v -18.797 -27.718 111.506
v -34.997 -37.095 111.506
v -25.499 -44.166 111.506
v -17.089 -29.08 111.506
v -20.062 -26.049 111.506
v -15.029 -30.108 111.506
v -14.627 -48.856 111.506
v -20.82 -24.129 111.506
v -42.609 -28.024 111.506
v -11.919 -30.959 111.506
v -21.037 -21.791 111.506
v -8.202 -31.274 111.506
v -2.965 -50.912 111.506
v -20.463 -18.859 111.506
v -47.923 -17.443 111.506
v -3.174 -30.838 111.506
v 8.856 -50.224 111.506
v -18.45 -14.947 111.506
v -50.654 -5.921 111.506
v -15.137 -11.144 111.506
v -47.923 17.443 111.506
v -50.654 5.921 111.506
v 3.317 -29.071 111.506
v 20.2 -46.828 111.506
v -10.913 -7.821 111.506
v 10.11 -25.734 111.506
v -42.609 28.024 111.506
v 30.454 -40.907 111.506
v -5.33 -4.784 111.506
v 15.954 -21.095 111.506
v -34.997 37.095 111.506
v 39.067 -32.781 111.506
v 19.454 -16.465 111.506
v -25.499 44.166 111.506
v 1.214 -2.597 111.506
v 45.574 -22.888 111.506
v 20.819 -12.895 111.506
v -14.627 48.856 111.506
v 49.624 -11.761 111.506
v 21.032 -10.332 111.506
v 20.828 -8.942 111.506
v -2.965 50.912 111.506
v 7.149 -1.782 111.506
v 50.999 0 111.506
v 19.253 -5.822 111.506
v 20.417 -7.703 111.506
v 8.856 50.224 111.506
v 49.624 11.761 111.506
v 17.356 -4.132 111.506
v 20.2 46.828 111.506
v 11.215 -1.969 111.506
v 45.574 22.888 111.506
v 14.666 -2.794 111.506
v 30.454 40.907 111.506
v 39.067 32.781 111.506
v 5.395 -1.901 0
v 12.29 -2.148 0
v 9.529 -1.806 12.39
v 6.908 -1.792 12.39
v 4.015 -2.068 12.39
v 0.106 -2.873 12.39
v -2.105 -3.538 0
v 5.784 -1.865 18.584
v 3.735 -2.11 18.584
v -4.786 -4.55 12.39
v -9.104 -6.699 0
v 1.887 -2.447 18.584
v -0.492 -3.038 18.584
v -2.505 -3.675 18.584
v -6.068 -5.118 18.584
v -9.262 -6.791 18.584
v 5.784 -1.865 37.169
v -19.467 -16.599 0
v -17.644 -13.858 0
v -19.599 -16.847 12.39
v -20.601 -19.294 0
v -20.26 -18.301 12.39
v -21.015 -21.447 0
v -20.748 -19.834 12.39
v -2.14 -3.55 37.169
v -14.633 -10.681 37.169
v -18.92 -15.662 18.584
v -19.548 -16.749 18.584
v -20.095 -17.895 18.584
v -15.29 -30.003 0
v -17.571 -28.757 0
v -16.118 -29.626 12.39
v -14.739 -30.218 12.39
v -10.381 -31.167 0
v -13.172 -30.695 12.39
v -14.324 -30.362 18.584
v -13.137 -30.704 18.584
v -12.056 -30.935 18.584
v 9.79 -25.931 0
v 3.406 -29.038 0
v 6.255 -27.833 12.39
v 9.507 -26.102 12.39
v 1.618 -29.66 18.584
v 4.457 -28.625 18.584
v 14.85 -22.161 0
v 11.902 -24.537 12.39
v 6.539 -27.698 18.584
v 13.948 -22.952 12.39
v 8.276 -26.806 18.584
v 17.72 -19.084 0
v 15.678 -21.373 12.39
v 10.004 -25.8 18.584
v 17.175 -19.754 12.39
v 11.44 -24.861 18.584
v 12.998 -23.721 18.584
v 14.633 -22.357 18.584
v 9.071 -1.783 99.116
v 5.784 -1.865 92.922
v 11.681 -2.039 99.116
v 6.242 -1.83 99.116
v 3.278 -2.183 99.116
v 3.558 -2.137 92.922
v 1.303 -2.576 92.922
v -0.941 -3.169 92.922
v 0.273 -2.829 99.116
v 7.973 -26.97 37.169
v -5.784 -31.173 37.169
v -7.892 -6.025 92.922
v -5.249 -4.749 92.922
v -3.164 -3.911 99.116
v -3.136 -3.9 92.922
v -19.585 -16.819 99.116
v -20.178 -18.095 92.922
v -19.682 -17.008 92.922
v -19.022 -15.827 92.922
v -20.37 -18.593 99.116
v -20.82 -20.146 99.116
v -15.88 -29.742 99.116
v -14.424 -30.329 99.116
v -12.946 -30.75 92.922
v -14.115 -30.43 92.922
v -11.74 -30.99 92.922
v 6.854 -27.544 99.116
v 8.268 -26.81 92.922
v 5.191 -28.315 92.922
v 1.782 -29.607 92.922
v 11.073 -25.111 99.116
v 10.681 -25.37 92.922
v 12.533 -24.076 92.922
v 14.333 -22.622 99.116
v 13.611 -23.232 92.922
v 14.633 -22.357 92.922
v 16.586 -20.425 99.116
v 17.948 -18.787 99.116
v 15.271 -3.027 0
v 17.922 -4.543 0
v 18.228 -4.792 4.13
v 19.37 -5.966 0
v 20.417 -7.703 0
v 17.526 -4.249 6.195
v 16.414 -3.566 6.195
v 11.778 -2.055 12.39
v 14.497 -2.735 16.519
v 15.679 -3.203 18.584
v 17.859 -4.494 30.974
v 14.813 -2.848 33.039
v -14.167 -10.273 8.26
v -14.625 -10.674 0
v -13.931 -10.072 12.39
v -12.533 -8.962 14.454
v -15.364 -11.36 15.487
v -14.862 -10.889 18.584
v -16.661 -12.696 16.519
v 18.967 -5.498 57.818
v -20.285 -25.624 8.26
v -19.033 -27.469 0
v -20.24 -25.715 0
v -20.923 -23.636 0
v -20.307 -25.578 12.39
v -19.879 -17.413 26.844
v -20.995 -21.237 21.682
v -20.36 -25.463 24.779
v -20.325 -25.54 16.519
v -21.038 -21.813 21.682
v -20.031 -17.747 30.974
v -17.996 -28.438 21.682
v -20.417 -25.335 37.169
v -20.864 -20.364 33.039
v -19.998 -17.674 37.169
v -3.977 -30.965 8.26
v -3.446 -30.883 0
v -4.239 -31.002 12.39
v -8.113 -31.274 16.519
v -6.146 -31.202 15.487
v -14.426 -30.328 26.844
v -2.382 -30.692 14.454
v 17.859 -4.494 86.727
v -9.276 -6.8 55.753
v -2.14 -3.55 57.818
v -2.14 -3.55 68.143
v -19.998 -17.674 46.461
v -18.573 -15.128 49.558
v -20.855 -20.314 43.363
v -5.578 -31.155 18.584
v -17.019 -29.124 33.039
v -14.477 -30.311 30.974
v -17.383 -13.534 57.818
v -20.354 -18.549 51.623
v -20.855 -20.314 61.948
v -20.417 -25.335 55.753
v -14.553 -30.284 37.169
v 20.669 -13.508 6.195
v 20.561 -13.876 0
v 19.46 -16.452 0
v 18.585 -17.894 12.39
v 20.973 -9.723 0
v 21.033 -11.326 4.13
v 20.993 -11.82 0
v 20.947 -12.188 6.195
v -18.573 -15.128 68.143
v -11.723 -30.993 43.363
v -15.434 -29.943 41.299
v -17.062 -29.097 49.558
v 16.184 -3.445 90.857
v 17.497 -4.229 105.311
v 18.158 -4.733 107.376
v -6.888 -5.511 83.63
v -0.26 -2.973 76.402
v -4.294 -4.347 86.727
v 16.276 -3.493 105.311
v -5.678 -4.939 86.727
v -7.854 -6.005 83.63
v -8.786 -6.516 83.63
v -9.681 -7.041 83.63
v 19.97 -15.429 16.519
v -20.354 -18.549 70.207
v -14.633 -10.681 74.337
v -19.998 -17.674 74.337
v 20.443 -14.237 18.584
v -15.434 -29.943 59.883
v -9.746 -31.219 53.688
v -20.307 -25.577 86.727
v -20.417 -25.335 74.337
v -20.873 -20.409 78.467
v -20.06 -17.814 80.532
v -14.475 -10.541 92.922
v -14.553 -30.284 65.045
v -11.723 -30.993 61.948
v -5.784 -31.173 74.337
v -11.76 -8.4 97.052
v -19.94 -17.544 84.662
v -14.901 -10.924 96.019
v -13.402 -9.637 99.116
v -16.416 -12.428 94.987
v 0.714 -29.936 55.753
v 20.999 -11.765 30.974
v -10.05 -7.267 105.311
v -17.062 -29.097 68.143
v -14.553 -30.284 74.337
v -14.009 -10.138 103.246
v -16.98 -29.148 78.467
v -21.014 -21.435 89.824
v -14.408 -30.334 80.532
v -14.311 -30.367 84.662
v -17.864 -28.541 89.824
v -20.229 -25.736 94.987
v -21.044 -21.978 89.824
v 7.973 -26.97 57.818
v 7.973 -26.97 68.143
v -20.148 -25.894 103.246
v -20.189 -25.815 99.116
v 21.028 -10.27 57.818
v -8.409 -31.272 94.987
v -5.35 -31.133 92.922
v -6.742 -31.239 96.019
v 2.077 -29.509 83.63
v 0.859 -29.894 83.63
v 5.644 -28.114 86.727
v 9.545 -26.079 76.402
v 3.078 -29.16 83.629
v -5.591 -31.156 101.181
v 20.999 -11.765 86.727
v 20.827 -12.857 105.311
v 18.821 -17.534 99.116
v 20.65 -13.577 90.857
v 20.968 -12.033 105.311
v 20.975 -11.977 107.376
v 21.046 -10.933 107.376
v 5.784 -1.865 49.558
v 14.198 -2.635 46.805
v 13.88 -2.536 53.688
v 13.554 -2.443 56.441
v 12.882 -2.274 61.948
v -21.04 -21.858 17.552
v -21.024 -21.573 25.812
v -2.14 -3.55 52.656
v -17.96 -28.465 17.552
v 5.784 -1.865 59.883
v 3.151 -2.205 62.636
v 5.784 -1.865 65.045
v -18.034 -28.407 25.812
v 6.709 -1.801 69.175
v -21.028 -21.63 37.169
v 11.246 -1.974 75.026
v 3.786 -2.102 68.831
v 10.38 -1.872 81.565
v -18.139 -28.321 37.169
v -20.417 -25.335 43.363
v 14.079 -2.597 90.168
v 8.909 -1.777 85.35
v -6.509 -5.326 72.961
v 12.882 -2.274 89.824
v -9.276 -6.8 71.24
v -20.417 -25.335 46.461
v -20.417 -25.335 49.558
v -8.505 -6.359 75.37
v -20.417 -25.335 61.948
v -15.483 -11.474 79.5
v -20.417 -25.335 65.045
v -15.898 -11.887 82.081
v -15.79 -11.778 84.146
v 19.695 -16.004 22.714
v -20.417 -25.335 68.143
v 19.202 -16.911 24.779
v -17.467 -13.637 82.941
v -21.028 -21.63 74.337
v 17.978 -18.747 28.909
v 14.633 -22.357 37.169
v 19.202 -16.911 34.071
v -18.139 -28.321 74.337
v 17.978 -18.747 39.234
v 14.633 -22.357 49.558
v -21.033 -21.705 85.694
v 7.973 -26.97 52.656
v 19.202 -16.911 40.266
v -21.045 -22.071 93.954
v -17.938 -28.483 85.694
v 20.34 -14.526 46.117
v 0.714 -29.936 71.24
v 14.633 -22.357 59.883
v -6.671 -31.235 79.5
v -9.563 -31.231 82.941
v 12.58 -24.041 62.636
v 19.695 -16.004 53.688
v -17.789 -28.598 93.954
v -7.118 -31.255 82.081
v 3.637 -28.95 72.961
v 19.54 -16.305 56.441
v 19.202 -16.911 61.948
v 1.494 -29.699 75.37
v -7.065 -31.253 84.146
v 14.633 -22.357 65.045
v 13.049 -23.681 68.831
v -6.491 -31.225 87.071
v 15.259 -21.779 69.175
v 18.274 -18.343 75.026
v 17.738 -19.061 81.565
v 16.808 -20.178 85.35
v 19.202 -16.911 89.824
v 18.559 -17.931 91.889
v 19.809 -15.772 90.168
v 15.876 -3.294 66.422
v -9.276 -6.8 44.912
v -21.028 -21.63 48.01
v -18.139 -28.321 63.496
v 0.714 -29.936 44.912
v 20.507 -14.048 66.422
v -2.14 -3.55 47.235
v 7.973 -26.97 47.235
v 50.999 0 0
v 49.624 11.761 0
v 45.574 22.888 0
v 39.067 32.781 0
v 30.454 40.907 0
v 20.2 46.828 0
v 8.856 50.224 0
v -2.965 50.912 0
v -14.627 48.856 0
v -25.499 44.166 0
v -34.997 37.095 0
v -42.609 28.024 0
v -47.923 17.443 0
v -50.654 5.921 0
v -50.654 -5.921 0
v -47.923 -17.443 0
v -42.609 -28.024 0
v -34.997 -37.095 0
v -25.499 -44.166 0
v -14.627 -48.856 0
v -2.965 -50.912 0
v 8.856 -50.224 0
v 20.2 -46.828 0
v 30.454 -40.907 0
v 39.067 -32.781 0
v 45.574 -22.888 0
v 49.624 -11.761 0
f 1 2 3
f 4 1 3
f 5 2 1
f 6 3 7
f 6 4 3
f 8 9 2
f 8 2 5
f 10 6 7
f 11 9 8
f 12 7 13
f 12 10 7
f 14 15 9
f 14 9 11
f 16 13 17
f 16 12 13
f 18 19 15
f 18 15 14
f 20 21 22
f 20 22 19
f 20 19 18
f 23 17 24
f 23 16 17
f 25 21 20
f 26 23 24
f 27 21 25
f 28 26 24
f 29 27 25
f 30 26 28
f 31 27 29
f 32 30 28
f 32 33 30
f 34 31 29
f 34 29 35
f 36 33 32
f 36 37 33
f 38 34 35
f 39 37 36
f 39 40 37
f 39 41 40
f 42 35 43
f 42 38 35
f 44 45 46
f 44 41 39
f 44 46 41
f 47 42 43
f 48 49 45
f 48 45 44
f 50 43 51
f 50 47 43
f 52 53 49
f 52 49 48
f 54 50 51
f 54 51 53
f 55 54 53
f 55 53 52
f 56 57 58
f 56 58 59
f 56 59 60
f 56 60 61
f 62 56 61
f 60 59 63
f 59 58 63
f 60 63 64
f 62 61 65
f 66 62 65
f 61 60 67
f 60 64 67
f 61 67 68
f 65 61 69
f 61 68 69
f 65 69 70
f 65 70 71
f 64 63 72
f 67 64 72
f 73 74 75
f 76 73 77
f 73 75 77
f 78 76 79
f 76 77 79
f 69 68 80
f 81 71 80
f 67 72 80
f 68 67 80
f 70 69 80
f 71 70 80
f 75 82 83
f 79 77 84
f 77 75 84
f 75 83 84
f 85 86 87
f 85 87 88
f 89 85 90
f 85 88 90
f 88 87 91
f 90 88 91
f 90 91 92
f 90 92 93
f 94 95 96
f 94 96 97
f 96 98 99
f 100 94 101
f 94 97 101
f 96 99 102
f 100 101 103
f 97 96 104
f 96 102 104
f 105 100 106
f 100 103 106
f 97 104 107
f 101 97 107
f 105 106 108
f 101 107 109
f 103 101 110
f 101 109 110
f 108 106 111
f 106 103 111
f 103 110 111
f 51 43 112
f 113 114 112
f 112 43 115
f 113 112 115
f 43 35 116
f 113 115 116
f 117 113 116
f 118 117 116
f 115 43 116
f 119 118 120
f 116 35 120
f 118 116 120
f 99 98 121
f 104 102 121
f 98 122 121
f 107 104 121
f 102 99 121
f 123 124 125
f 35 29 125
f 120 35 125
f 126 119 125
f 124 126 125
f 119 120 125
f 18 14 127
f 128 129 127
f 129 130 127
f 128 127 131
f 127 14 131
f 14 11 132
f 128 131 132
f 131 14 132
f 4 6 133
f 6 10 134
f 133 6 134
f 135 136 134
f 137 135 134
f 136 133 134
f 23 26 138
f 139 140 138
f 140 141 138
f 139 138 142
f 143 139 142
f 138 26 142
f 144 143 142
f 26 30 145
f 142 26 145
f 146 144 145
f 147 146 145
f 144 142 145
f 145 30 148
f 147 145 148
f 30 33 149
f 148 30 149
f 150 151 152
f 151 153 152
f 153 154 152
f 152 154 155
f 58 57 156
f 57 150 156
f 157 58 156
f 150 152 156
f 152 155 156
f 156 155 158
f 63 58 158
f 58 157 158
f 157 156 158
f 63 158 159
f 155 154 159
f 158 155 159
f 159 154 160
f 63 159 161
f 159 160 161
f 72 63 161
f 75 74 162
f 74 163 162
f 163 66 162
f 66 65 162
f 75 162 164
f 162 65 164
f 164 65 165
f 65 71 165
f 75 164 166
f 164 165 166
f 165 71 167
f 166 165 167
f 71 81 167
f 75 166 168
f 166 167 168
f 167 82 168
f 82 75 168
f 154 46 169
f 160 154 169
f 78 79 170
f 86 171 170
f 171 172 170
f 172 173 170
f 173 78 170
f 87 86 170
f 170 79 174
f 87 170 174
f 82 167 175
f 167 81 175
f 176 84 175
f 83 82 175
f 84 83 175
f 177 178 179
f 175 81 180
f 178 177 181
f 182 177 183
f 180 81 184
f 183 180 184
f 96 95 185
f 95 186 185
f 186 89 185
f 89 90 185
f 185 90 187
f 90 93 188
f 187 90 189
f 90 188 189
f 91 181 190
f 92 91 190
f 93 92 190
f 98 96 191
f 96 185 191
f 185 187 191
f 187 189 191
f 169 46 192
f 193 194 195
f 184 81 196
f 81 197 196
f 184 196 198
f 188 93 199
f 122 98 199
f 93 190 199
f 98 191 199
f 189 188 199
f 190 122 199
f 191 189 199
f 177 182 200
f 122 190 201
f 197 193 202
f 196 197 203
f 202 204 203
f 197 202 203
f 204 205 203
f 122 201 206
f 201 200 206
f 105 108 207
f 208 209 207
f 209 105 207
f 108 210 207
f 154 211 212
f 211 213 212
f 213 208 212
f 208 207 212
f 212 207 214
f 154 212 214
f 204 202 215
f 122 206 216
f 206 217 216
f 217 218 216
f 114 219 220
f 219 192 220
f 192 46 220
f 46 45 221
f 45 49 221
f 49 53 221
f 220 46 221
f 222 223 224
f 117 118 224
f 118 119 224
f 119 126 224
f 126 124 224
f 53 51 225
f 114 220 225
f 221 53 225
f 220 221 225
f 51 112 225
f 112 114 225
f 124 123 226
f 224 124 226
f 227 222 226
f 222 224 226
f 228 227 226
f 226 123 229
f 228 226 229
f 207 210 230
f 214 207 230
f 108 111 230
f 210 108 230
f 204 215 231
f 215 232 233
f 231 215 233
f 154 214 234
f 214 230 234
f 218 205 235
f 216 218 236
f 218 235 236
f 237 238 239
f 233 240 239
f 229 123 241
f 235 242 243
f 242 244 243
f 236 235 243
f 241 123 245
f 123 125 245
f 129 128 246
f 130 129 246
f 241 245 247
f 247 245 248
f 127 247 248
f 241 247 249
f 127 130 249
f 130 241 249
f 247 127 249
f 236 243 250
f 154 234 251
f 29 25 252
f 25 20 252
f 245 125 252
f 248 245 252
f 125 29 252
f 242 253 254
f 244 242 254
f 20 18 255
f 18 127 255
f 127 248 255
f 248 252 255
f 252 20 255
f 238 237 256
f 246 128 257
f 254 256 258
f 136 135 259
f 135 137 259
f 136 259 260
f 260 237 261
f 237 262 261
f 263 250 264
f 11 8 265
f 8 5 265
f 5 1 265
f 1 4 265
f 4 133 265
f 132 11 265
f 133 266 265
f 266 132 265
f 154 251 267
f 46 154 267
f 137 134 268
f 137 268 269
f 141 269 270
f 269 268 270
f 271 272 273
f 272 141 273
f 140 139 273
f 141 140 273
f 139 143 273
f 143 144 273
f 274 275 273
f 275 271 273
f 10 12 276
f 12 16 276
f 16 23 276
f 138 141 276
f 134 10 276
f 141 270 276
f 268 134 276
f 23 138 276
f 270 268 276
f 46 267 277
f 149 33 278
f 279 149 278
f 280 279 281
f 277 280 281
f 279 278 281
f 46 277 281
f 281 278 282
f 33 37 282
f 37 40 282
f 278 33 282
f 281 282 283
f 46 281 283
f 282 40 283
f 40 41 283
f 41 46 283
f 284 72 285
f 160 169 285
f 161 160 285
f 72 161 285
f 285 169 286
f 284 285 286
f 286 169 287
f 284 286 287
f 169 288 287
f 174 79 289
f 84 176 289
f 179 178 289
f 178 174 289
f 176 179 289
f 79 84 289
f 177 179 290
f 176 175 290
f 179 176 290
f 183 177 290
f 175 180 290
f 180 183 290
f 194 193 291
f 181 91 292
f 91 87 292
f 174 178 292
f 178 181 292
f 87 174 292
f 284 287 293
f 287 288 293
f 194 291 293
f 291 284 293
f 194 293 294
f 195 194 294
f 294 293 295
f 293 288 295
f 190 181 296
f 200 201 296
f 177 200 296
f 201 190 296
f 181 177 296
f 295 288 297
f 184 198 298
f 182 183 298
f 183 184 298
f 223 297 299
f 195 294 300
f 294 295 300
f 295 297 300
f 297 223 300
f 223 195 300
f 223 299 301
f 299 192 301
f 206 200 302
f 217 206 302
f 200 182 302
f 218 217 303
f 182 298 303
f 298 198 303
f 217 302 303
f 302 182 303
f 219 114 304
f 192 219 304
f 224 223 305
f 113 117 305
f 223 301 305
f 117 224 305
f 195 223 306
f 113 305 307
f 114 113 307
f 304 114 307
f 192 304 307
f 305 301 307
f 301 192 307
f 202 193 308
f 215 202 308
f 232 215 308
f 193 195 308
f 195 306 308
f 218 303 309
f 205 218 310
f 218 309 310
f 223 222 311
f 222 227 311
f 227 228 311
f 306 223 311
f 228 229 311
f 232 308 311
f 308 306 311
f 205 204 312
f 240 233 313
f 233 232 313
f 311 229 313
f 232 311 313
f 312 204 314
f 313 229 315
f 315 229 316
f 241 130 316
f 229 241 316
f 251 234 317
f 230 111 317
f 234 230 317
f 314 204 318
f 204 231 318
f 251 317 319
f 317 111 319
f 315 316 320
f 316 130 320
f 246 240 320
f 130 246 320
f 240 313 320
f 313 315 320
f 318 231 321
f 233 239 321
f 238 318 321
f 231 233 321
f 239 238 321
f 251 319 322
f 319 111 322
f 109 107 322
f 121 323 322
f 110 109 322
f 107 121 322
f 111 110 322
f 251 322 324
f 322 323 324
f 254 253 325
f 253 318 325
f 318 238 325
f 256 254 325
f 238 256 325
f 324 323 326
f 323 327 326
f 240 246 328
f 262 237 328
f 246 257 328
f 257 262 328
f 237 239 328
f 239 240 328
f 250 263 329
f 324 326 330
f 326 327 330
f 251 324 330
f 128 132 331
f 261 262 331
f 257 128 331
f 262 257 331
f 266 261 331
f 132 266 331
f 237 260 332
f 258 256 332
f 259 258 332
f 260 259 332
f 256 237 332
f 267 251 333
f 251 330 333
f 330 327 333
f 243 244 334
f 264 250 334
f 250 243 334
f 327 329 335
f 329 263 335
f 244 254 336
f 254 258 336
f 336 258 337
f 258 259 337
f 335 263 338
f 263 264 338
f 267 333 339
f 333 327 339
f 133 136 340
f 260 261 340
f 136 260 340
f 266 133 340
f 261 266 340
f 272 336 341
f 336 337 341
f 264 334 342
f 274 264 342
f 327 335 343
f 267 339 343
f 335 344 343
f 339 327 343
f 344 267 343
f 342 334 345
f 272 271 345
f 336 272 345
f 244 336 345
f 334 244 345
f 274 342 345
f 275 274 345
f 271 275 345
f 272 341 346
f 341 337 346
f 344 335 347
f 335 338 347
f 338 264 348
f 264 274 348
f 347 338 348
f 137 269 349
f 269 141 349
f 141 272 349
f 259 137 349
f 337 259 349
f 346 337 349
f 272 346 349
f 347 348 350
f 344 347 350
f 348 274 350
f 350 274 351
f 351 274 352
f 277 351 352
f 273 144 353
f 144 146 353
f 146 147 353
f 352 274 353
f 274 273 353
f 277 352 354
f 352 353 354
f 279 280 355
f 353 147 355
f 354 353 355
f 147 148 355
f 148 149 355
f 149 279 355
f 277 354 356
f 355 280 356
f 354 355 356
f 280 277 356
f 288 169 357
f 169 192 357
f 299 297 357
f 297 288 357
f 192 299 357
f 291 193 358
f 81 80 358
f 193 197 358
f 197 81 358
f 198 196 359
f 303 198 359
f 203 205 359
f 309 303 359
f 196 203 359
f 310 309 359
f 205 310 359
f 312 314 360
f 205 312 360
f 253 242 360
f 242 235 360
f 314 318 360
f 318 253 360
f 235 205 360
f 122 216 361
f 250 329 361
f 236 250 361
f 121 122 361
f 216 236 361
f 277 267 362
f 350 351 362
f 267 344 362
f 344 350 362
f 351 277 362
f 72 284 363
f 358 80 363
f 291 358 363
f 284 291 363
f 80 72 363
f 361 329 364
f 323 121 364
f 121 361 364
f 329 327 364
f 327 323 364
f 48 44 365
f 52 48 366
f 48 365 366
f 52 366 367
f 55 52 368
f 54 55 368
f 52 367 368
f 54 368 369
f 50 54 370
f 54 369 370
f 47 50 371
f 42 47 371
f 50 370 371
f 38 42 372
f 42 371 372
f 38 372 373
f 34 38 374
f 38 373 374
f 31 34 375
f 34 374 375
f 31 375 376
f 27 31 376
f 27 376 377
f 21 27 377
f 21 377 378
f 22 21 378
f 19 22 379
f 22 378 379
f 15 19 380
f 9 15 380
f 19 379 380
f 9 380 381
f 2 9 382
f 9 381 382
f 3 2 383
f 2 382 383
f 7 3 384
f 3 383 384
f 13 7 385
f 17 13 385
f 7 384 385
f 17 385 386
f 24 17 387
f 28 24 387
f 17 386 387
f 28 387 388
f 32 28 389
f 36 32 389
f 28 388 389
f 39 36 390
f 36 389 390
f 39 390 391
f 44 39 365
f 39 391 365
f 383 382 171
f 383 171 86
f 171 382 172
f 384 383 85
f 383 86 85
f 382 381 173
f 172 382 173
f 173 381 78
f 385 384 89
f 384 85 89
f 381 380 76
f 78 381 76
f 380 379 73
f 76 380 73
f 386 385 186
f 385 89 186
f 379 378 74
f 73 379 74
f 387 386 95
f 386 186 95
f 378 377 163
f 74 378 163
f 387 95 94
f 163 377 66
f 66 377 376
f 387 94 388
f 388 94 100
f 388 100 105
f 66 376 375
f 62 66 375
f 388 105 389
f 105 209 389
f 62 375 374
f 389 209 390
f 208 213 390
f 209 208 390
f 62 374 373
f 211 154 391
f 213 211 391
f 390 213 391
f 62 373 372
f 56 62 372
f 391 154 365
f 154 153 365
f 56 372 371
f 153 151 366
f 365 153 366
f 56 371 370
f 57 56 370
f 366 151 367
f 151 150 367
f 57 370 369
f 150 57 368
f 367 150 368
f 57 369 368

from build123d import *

# Parameters (mm, degrees)
F0_R     = 50.998703
F1_DEPTH = 111.506
F3_DEPTH = 25.4
F4_DEPTH = 219.964


with BuildPart() as f1:
    # F0 (on Top) → F1 (new body)
    with BuildSketch(Plane.XY):
        Circle(F0_R)
    extrude(amount=F1_DEPTH)

    # F2 (on face) → F3 (join)
    with BuildSketch(Plane.XY.offset(111.506)):
        with BuildLine():
            add(Edge.make_bspline(
                [(20.416819, -7.703019), (11.568052, 12.789288), (-14.632792, -10.68112), (-40.833637, -34.151528), (-5.784026, -31.173427), (29.265585, -28.195327), (20.416819, -7.703019)],
                knots=[0, 0, 0, 2.094395, 2.094395, 4.18879, 4.18879, 6.283185, 6.283185, 6.283185], degree=2, weights=[1, 0.5, 1, 0.5, 1, 0.5, 1]))
        make_face()
    extrude(amount=F3_DEPTH)

    # F3_face (on face) → F4 (cut)
    with BuildSketch(Plane(origin=(0.082109, -16.547367, 136.906), x_dir=(1, 0, 0), z_dir=(0, 0, 1))):
        with BuildLine():
            add(Edge.make_bspline(
                [(20.33471, 8.844348), (11.485943, 29.336655), (-14.714901, 5.866247), (-40.915746, -17.604161), (-5.866135, -14.62606), (29.183476, -11.64796), (20.33471, 8.844348)],
                knots=[0, 0, 0, 2.094395, 2.094395, 4.18879, 4.18879, 6.283185, 6.283185, 6.283185], degree=2, weights=[1, 0.5, 1, 0.5, 1, 0.5, 1]))
        make_face()
    extrude(amount=-F4_DEPTH, mode=Mode.SUBTRACT)


solid = f1.part
